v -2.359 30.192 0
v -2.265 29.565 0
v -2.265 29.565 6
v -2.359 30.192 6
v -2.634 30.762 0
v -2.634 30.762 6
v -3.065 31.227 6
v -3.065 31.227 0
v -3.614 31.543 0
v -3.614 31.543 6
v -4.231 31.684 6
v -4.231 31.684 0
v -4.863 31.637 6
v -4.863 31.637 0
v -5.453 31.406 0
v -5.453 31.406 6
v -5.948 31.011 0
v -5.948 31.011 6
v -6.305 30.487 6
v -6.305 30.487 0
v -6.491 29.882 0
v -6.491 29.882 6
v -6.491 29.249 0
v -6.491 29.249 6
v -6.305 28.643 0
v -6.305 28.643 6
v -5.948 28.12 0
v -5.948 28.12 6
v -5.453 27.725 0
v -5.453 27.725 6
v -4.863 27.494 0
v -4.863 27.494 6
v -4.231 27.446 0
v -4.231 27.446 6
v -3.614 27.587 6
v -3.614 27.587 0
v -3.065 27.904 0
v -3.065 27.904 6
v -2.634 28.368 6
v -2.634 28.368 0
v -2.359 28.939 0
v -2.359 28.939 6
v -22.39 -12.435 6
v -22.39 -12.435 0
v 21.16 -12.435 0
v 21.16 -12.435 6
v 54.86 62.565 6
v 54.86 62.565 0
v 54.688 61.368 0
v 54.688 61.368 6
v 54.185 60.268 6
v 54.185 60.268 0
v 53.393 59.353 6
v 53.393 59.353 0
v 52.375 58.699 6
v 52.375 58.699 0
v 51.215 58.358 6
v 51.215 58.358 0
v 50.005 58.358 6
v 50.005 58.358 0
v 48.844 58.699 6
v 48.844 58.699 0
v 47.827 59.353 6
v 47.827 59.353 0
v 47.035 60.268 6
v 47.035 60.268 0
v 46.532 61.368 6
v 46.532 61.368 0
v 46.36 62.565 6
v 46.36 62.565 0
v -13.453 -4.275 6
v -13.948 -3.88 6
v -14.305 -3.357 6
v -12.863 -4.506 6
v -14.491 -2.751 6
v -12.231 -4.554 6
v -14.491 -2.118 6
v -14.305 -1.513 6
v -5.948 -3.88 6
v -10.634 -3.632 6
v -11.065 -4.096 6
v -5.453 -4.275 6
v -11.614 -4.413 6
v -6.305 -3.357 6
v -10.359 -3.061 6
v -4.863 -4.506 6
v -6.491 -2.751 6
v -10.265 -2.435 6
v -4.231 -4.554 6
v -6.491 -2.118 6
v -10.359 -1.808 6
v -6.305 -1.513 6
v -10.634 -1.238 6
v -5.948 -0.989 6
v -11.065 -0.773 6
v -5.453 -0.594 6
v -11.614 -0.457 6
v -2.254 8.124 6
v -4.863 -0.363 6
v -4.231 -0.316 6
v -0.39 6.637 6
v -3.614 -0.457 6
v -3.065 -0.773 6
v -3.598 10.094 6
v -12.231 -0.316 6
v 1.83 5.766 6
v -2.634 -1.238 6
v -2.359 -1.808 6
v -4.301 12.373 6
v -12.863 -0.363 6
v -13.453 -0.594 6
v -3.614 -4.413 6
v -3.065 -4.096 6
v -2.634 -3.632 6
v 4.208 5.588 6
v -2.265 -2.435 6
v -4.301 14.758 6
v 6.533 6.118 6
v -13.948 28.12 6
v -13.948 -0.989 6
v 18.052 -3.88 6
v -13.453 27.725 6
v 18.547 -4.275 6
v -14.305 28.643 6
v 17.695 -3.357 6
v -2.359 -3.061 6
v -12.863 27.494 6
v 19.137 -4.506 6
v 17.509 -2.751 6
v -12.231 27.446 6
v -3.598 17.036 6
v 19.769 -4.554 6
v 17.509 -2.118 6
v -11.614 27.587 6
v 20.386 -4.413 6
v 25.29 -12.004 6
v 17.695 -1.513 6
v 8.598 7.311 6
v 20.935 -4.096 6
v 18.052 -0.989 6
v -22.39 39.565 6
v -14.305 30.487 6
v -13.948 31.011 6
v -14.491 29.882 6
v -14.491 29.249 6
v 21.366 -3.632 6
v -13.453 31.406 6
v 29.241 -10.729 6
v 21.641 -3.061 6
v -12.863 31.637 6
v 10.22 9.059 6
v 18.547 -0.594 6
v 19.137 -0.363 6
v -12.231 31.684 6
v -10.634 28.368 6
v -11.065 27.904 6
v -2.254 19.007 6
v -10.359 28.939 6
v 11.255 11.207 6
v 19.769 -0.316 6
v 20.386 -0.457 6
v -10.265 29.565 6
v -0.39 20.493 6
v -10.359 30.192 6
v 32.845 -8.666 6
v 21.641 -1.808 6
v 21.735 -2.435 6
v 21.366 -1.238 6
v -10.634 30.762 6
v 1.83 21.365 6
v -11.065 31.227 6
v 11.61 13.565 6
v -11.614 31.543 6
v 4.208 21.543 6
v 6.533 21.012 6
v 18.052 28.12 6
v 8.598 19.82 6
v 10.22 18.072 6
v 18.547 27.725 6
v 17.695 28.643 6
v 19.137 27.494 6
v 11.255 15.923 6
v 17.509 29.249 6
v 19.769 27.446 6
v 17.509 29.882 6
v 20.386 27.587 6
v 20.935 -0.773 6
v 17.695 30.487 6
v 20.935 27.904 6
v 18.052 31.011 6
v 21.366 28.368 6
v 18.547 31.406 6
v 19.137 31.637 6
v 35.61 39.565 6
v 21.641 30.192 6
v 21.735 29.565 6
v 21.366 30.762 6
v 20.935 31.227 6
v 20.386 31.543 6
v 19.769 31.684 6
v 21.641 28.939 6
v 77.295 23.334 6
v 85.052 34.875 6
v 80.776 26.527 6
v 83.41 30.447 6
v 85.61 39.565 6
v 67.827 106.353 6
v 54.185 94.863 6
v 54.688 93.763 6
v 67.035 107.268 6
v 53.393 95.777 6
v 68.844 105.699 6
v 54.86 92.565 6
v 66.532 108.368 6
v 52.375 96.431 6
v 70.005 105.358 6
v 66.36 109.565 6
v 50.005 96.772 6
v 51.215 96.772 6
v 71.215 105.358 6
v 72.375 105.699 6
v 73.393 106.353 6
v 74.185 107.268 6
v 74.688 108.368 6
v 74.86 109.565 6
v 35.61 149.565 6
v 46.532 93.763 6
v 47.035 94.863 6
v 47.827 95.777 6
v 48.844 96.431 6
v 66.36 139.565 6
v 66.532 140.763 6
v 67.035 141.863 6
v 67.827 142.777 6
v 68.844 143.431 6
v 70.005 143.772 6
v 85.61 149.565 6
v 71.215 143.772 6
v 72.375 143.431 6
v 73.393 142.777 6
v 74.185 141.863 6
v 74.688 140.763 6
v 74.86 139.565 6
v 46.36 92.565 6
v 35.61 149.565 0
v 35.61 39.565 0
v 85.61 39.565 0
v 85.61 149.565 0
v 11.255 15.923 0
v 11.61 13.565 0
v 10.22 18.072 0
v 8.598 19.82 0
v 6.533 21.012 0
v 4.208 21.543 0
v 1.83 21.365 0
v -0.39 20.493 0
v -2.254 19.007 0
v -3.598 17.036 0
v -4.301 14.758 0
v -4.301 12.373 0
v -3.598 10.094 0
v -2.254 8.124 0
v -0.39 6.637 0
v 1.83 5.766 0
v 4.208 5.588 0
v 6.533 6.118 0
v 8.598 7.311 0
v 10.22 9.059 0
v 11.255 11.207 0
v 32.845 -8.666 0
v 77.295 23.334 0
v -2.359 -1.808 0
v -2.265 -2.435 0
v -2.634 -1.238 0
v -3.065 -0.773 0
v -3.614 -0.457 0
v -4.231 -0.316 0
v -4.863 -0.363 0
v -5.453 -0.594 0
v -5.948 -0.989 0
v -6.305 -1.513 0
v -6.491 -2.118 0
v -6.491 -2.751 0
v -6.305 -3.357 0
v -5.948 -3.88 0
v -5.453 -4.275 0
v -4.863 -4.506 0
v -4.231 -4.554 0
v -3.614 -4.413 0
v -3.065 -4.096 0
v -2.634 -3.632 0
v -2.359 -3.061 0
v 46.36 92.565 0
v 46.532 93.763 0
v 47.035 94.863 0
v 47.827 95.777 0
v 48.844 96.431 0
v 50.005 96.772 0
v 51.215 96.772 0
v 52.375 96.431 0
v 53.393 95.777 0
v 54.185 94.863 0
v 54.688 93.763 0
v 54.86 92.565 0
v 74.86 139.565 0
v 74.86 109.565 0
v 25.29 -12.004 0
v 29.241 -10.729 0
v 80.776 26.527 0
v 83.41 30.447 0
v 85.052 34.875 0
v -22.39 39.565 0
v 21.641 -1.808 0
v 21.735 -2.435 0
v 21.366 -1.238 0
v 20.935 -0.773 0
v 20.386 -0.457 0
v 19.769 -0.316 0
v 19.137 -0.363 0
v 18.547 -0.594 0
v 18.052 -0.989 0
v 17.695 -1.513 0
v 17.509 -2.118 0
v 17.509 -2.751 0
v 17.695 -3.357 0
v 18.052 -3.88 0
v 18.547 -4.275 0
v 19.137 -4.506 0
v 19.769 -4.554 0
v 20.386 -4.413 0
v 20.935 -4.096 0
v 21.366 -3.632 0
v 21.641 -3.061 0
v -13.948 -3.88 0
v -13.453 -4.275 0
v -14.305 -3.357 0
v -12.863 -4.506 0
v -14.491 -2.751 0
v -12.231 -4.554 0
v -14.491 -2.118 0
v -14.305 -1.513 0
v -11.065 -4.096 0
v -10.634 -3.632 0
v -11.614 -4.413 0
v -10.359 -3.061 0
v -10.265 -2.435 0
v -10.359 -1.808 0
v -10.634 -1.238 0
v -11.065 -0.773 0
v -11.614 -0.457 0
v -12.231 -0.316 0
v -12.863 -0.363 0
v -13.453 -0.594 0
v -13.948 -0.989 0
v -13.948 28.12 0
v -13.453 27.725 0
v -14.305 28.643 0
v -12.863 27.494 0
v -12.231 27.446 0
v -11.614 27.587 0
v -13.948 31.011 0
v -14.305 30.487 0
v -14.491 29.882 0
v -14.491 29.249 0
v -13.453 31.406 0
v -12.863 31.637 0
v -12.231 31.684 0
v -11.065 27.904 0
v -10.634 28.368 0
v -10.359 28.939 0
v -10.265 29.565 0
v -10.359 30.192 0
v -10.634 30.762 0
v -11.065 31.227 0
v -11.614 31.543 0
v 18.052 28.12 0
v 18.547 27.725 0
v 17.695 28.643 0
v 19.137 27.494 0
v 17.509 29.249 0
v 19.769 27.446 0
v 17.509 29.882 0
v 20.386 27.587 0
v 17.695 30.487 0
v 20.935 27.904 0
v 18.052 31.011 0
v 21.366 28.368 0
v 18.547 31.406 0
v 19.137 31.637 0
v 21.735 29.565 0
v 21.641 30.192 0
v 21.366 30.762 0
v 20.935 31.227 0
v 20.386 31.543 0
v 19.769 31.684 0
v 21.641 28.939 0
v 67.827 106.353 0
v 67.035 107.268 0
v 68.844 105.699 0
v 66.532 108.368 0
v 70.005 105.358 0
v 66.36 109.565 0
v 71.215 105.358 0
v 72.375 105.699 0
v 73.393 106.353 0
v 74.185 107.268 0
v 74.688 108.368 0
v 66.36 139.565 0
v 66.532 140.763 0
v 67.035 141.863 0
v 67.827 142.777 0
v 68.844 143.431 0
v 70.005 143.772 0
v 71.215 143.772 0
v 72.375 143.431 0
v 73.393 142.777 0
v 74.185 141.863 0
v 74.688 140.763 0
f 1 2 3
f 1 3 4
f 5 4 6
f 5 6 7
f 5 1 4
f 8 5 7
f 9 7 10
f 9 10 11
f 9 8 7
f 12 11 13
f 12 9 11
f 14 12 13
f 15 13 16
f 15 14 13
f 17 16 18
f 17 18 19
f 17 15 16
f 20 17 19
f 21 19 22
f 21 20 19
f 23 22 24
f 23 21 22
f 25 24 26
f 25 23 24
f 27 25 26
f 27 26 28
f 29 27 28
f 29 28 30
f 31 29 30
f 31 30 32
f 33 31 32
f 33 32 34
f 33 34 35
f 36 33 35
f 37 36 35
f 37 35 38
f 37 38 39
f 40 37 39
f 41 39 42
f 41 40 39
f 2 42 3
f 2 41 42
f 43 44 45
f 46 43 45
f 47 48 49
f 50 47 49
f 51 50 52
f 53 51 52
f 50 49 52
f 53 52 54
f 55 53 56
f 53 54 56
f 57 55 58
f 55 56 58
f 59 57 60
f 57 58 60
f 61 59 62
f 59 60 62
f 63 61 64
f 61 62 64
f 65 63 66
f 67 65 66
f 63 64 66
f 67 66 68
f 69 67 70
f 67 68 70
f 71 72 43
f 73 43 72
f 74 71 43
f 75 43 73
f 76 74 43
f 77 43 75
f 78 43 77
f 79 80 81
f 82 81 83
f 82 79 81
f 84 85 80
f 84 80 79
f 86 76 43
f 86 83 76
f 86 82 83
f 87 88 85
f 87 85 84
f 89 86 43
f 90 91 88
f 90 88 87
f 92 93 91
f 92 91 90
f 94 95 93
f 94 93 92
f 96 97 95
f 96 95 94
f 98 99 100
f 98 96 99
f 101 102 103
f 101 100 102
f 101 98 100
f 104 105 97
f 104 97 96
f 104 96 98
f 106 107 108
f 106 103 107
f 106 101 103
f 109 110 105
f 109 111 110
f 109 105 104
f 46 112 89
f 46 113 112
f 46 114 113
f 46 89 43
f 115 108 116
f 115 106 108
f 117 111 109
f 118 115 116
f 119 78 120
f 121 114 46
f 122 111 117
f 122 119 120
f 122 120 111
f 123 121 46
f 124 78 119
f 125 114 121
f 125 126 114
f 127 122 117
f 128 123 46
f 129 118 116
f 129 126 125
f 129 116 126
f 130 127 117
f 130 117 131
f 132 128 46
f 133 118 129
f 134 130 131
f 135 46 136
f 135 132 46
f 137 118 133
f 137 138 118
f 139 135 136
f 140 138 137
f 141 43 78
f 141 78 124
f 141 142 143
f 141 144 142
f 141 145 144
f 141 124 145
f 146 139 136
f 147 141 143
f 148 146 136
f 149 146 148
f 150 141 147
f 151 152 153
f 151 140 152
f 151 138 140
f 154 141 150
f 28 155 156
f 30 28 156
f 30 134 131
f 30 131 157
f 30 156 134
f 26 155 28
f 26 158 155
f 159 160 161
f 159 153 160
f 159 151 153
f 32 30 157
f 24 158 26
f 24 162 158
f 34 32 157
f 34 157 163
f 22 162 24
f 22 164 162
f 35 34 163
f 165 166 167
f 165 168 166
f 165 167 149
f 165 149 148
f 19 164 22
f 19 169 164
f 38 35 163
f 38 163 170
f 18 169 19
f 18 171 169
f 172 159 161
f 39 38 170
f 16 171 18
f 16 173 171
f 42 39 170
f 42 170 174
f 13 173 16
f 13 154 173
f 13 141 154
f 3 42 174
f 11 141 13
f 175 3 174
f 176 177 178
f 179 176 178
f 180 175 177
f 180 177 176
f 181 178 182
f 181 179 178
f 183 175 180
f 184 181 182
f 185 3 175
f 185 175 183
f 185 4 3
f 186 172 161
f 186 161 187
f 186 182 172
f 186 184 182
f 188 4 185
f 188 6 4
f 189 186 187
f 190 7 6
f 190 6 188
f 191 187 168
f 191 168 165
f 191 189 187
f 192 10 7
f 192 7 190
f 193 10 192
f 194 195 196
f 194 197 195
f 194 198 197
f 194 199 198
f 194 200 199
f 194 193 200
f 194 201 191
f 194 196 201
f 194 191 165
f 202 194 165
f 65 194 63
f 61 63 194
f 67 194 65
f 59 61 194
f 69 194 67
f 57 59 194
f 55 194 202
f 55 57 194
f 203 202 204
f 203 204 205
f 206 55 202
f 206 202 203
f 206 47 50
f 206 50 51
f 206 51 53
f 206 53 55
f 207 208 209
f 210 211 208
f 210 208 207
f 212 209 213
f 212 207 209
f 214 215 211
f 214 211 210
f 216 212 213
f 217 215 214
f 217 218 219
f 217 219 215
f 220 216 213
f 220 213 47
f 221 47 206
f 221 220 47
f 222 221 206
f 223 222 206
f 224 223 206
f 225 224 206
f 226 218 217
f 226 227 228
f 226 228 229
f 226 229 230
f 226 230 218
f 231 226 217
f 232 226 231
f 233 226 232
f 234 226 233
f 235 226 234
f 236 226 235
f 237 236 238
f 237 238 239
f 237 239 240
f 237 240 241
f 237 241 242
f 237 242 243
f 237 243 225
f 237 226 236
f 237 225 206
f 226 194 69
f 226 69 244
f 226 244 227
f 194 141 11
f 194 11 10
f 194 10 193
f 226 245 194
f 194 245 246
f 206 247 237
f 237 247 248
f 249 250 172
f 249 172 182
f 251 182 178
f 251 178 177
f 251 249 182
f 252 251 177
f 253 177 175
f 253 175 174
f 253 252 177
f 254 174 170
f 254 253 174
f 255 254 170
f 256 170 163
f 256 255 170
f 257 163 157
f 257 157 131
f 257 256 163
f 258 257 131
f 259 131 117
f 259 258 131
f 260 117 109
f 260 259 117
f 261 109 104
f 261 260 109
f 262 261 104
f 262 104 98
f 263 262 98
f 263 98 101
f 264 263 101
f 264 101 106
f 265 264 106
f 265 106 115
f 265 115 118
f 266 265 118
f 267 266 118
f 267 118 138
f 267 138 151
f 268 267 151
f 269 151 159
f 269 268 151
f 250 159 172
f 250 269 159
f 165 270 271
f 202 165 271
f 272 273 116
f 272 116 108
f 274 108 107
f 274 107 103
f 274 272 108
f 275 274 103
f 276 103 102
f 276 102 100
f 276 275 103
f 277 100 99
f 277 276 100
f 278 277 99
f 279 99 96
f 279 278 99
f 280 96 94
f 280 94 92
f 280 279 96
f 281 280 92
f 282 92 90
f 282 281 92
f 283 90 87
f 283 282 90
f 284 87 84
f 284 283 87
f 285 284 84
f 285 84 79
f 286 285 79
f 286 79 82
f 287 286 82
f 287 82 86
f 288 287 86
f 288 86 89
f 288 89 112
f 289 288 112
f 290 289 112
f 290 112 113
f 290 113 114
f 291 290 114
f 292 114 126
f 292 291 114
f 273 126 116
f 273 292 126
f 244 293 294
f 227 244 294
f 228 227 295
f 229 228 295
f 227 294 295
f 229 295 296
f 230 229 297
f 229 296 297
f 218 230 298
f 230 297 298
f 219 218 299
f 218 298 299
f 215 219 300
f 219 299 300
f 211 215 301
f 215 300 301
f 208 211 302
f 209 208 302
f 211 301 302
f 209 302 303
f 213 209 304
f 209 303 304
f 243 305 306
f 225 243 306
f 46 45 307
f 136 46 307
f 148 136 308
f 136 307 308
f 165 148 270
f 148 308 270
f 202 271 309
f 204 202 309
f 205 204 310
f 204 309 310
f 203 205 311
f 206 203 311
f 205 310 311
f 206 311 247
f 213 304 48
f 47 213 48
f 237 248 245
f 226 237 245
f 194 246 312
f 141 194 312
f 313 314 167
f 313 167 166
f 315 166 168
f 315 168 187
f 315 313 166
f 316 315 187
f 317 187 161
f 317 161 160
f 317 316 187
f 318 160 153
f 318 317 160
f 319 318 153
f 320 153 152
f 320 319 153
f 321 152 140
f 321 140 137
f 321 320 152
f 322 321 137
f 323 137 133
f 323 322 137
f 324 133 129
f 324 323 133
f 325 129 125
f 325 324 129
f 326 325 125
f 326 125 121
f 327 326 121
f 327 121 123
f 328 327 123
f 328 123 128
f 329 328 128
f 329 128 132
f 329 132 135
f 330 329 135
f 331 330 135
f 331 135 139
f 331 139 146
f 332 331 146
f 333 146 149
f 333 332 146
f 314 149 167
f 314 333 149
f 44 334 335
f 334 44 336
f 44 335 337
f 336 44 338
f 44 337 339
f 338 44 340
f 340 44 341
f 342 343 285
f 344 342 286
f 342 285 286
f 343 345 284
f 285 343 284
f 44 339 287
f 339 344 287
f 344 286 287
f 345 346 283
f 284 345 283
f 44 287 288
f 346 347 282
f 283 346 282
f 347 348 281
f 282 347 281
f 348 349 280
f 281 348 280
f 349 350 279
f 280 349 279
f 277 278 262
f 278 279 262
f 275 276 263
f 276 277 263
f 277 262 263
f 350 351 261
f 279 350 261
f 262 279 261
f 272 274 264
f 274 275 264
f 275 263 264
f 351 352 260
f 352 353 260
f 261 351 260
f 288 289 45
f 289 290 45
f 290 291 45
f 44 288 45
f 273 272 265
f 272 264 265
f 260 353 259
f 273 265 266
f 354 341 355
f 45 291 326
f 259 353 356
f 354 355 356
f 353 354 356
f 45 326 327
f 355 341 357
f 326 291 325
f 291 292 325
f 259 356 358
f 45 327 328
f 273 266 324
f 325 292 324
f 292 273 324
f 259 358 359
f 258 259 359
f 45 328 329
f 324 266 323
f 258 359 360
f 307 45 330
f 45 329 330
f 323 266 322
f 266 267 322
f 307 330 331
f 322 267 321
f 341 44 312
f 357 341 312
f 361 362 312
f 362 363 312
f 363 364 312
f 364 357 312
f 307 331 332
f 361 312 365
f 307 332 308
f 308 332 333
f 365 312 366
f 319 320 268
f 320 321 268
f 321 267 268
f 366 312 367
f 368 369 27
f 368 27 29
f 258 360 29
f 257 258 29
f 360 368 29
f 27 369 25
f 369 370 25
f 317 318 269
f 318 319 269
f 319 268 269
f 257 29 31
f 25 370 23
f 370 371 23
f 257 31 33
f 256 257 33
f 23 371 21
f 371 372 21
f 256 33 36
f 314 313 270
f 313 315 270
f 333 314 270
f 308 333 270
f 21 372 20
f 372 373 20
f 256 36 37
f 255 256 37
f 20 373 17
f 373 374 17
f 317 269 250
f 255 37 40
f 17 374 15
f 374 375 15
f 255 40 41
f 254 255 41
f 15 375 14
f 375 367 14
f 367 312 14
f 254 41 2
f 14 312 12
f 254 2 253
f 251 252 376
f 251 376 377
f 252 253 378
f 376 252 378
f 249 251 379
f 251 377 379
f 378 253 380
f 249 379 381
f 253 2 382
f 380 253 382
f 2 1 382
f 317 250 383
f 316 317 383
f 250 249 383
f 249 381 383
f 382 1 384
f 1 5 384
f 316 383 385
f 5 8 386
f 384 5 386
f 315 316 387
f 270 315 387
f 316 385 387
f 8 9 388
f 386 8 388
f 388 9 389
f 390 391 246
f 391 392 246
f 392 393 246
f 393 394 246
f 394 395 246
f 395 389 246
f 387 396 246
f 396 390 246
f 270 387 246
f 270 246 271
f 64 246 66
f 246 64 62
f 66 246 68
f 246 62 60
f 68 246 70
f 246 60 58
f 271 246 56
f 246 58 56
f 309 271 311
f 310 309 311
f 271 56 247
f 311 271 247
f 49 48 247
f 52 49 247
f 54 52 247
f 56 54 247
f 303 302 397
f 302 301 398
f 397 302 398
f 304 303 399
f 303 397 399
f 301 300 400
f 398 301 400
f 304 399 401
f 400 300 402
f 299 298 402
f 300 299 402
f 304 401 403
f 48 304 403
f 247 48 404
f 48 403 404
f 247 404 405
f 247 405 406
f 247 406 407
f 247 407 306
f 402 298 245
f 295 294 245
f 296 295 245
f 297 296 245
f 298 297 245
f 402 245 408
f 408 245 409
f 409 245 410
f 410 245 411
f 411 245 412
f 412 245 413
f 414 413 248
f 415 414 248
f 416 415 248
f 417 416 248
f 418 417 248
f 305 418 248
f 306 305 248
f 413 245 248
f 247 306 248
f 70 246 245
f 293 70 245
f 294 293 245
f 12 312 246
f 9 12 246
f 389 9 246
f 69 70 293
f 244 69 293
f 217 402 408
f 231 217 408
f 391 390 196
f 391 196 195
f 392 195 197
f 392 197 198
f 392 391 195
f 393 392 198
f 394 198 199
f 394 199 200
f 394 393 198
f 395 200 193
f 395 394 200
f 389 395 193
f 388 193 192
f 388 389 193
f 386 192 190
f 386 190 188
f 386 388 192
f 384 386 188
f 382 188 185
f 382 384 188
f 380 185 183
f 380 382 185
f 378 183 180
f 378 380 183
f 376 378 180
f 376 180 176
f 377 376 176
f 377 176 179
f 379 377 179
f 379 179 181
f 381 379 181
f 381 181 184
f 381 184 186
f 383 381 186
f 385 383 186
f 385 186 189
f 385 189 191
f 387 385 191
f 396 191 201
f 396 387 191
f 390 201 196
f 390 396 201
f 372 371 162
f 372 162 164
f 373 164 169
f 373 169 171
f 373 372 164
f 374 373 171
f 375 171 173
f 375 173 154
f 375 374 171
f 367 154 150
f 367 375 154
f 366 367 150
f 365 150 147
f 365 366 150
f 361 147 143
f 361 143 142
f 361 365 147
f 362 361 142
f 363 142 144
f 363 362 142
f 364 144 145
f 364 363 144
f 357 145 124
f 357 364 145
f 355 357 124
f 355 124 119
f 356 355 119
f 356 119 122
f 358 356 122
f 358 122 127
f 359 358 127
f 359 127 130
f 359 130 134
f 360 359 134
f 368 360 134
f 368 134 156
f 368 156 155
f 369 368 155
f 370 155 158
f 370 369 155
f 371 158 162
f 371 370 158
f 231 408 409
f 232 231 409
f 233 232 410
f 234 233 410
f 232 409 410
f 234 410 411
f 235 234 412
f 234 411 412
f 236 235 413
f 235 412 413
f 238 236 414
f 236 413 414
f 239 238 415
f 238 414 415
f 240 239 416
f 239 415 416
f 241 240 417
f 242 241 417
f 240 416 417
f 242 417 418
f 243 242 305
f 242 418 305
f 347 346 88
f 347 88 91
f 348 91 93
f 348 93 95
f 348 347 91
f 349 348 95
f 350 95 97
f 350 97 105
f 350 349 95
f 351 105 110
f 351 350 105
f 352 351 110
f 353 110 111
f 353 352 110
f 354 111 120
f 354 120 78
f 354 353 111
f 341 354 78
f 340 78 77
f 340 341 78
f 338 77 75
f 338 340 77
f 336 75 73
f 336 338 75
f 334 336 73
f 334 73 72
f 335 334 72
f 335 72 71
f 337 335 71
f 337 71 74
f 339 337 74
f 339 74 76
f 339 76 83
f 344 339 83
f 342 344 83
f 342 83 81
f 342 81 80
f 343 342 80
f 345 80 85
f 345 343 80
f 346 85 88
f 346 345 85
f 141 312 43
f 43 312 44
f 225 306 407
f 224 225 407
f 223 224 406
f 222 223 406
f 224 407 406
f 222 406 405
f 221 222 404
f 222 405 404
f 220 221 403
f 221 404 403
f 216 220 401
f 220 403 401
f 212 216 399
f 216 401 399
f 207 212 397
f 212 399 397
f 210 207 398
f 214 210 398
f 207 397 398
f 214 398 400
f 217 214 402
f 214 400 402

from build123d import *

# Parameters (mm, degrees)
SKETCH_1_R      = 2.125
SKETCH_1_R_2    = 8
EXTRUDE_1_DEPTH = 6


with BuildPart() as part:
    # 草图1 → 凸台-拉伸1 (new body)
    with BuildSketch(Plane.XY):
        with BuildLine():
            Line((-22.390026272, -12.434766873), (21.159720544, -12.434766873))
            ThreePointArc((21.159720544, -12.434766873), (27.298604017, -11.469317294), (32.844809242, -8.666177844))
            Line((32.844809242, -8.666177844), (77.295062426, 23.333822156))
            ThreePointArc((77.295062426, 23.333822156), (83.410279539, 30.44661958), (85.609973728, 39.565233127))
            Line((85.609973728, 39.565233127), (85.609973728, 149.565233127))
            Line((85.609973728, 149.565233127), (35.609973728, 149.565233127))
            Line((35.609973728, 149.565233127), (35.609973728, 39.565233127))
            Line((35.609973728, 39.565233127), (27.609973728, 39.565233127))
            Line((27.609973728, 39.565233127), (-22.390026272, 39.565233127))
            Line((-22.390026272, 39.565233127), (-22.390026272, -12.434766873))
        make_face()
        with Locations((-12.390026272, -2.434766873)):
            Circle(SKETCH_1_R, mode=Mode.SUBTRACT)
        with Locations((-4.390026272, -2.434766873)):
            Circle(SKETCH_1_R, mode=Mode.SUBTRACT)
        with Locations((19.609973728, -2.434766873)):
            Circle(SKETCH_1_R, mode=Mode.SUBTRACT)
        with Locations((-12.390026272, 29.565233127)):
            Circle(SKETCH_1_R, mode=Mode.SUBTRACT)
        with Locations((-4.390026272, 29.565233127)):
            Circle(SKETCH_1_R, mode=Mode.SUBTRACT)
        with Locations((19.609973728, 29.565233127)):
            Circle(SKETCH_1_R, mode=Mode.SUBTRACT)
        with Locations((3.609973728, 13.565233127)):
            Circle(SKETCH_1_R_2, mode=Mode.SUBTRACT)
        with BuildLine():
            Line((54.859973728, 92.565233127), (54.859973728, 62.565233127))
            ThreePointArc((54.859973728, 62.565233127), (50.609973728, 58.315233127), (46.359973728, 62.565233127))
            Line((46.359973728, 62.565233127), (46.359973728, 92.565233127))
            ThreePointArc((46.359973728, 92.565233127), (50.609973728, 96.815233127), (54.859973728, 92.565233127))
        make_face(mode=Mode.SUBTRACT)
        with BuildLine():
            Line((66.359973728, 109.565233127), (66.359973728, 139.565233127))
            ThreePointArc((66.359973728, 139.565233127), (70.609973728, 143.815233127), (74.859973728, 139.565233127))
            Line((74.859973728, 139.565233127), (74.859973728, 109.565233127))
            ThreePointArc((74.859973728, 109.565233127), (70.609973728, 105.315233127), (66.359973728, 109.565233127))
        make_face(mode=Mode.SUBTRACT)
    extrude(amount=EXTRUDE_1_DEPTH)


solid = part.part
